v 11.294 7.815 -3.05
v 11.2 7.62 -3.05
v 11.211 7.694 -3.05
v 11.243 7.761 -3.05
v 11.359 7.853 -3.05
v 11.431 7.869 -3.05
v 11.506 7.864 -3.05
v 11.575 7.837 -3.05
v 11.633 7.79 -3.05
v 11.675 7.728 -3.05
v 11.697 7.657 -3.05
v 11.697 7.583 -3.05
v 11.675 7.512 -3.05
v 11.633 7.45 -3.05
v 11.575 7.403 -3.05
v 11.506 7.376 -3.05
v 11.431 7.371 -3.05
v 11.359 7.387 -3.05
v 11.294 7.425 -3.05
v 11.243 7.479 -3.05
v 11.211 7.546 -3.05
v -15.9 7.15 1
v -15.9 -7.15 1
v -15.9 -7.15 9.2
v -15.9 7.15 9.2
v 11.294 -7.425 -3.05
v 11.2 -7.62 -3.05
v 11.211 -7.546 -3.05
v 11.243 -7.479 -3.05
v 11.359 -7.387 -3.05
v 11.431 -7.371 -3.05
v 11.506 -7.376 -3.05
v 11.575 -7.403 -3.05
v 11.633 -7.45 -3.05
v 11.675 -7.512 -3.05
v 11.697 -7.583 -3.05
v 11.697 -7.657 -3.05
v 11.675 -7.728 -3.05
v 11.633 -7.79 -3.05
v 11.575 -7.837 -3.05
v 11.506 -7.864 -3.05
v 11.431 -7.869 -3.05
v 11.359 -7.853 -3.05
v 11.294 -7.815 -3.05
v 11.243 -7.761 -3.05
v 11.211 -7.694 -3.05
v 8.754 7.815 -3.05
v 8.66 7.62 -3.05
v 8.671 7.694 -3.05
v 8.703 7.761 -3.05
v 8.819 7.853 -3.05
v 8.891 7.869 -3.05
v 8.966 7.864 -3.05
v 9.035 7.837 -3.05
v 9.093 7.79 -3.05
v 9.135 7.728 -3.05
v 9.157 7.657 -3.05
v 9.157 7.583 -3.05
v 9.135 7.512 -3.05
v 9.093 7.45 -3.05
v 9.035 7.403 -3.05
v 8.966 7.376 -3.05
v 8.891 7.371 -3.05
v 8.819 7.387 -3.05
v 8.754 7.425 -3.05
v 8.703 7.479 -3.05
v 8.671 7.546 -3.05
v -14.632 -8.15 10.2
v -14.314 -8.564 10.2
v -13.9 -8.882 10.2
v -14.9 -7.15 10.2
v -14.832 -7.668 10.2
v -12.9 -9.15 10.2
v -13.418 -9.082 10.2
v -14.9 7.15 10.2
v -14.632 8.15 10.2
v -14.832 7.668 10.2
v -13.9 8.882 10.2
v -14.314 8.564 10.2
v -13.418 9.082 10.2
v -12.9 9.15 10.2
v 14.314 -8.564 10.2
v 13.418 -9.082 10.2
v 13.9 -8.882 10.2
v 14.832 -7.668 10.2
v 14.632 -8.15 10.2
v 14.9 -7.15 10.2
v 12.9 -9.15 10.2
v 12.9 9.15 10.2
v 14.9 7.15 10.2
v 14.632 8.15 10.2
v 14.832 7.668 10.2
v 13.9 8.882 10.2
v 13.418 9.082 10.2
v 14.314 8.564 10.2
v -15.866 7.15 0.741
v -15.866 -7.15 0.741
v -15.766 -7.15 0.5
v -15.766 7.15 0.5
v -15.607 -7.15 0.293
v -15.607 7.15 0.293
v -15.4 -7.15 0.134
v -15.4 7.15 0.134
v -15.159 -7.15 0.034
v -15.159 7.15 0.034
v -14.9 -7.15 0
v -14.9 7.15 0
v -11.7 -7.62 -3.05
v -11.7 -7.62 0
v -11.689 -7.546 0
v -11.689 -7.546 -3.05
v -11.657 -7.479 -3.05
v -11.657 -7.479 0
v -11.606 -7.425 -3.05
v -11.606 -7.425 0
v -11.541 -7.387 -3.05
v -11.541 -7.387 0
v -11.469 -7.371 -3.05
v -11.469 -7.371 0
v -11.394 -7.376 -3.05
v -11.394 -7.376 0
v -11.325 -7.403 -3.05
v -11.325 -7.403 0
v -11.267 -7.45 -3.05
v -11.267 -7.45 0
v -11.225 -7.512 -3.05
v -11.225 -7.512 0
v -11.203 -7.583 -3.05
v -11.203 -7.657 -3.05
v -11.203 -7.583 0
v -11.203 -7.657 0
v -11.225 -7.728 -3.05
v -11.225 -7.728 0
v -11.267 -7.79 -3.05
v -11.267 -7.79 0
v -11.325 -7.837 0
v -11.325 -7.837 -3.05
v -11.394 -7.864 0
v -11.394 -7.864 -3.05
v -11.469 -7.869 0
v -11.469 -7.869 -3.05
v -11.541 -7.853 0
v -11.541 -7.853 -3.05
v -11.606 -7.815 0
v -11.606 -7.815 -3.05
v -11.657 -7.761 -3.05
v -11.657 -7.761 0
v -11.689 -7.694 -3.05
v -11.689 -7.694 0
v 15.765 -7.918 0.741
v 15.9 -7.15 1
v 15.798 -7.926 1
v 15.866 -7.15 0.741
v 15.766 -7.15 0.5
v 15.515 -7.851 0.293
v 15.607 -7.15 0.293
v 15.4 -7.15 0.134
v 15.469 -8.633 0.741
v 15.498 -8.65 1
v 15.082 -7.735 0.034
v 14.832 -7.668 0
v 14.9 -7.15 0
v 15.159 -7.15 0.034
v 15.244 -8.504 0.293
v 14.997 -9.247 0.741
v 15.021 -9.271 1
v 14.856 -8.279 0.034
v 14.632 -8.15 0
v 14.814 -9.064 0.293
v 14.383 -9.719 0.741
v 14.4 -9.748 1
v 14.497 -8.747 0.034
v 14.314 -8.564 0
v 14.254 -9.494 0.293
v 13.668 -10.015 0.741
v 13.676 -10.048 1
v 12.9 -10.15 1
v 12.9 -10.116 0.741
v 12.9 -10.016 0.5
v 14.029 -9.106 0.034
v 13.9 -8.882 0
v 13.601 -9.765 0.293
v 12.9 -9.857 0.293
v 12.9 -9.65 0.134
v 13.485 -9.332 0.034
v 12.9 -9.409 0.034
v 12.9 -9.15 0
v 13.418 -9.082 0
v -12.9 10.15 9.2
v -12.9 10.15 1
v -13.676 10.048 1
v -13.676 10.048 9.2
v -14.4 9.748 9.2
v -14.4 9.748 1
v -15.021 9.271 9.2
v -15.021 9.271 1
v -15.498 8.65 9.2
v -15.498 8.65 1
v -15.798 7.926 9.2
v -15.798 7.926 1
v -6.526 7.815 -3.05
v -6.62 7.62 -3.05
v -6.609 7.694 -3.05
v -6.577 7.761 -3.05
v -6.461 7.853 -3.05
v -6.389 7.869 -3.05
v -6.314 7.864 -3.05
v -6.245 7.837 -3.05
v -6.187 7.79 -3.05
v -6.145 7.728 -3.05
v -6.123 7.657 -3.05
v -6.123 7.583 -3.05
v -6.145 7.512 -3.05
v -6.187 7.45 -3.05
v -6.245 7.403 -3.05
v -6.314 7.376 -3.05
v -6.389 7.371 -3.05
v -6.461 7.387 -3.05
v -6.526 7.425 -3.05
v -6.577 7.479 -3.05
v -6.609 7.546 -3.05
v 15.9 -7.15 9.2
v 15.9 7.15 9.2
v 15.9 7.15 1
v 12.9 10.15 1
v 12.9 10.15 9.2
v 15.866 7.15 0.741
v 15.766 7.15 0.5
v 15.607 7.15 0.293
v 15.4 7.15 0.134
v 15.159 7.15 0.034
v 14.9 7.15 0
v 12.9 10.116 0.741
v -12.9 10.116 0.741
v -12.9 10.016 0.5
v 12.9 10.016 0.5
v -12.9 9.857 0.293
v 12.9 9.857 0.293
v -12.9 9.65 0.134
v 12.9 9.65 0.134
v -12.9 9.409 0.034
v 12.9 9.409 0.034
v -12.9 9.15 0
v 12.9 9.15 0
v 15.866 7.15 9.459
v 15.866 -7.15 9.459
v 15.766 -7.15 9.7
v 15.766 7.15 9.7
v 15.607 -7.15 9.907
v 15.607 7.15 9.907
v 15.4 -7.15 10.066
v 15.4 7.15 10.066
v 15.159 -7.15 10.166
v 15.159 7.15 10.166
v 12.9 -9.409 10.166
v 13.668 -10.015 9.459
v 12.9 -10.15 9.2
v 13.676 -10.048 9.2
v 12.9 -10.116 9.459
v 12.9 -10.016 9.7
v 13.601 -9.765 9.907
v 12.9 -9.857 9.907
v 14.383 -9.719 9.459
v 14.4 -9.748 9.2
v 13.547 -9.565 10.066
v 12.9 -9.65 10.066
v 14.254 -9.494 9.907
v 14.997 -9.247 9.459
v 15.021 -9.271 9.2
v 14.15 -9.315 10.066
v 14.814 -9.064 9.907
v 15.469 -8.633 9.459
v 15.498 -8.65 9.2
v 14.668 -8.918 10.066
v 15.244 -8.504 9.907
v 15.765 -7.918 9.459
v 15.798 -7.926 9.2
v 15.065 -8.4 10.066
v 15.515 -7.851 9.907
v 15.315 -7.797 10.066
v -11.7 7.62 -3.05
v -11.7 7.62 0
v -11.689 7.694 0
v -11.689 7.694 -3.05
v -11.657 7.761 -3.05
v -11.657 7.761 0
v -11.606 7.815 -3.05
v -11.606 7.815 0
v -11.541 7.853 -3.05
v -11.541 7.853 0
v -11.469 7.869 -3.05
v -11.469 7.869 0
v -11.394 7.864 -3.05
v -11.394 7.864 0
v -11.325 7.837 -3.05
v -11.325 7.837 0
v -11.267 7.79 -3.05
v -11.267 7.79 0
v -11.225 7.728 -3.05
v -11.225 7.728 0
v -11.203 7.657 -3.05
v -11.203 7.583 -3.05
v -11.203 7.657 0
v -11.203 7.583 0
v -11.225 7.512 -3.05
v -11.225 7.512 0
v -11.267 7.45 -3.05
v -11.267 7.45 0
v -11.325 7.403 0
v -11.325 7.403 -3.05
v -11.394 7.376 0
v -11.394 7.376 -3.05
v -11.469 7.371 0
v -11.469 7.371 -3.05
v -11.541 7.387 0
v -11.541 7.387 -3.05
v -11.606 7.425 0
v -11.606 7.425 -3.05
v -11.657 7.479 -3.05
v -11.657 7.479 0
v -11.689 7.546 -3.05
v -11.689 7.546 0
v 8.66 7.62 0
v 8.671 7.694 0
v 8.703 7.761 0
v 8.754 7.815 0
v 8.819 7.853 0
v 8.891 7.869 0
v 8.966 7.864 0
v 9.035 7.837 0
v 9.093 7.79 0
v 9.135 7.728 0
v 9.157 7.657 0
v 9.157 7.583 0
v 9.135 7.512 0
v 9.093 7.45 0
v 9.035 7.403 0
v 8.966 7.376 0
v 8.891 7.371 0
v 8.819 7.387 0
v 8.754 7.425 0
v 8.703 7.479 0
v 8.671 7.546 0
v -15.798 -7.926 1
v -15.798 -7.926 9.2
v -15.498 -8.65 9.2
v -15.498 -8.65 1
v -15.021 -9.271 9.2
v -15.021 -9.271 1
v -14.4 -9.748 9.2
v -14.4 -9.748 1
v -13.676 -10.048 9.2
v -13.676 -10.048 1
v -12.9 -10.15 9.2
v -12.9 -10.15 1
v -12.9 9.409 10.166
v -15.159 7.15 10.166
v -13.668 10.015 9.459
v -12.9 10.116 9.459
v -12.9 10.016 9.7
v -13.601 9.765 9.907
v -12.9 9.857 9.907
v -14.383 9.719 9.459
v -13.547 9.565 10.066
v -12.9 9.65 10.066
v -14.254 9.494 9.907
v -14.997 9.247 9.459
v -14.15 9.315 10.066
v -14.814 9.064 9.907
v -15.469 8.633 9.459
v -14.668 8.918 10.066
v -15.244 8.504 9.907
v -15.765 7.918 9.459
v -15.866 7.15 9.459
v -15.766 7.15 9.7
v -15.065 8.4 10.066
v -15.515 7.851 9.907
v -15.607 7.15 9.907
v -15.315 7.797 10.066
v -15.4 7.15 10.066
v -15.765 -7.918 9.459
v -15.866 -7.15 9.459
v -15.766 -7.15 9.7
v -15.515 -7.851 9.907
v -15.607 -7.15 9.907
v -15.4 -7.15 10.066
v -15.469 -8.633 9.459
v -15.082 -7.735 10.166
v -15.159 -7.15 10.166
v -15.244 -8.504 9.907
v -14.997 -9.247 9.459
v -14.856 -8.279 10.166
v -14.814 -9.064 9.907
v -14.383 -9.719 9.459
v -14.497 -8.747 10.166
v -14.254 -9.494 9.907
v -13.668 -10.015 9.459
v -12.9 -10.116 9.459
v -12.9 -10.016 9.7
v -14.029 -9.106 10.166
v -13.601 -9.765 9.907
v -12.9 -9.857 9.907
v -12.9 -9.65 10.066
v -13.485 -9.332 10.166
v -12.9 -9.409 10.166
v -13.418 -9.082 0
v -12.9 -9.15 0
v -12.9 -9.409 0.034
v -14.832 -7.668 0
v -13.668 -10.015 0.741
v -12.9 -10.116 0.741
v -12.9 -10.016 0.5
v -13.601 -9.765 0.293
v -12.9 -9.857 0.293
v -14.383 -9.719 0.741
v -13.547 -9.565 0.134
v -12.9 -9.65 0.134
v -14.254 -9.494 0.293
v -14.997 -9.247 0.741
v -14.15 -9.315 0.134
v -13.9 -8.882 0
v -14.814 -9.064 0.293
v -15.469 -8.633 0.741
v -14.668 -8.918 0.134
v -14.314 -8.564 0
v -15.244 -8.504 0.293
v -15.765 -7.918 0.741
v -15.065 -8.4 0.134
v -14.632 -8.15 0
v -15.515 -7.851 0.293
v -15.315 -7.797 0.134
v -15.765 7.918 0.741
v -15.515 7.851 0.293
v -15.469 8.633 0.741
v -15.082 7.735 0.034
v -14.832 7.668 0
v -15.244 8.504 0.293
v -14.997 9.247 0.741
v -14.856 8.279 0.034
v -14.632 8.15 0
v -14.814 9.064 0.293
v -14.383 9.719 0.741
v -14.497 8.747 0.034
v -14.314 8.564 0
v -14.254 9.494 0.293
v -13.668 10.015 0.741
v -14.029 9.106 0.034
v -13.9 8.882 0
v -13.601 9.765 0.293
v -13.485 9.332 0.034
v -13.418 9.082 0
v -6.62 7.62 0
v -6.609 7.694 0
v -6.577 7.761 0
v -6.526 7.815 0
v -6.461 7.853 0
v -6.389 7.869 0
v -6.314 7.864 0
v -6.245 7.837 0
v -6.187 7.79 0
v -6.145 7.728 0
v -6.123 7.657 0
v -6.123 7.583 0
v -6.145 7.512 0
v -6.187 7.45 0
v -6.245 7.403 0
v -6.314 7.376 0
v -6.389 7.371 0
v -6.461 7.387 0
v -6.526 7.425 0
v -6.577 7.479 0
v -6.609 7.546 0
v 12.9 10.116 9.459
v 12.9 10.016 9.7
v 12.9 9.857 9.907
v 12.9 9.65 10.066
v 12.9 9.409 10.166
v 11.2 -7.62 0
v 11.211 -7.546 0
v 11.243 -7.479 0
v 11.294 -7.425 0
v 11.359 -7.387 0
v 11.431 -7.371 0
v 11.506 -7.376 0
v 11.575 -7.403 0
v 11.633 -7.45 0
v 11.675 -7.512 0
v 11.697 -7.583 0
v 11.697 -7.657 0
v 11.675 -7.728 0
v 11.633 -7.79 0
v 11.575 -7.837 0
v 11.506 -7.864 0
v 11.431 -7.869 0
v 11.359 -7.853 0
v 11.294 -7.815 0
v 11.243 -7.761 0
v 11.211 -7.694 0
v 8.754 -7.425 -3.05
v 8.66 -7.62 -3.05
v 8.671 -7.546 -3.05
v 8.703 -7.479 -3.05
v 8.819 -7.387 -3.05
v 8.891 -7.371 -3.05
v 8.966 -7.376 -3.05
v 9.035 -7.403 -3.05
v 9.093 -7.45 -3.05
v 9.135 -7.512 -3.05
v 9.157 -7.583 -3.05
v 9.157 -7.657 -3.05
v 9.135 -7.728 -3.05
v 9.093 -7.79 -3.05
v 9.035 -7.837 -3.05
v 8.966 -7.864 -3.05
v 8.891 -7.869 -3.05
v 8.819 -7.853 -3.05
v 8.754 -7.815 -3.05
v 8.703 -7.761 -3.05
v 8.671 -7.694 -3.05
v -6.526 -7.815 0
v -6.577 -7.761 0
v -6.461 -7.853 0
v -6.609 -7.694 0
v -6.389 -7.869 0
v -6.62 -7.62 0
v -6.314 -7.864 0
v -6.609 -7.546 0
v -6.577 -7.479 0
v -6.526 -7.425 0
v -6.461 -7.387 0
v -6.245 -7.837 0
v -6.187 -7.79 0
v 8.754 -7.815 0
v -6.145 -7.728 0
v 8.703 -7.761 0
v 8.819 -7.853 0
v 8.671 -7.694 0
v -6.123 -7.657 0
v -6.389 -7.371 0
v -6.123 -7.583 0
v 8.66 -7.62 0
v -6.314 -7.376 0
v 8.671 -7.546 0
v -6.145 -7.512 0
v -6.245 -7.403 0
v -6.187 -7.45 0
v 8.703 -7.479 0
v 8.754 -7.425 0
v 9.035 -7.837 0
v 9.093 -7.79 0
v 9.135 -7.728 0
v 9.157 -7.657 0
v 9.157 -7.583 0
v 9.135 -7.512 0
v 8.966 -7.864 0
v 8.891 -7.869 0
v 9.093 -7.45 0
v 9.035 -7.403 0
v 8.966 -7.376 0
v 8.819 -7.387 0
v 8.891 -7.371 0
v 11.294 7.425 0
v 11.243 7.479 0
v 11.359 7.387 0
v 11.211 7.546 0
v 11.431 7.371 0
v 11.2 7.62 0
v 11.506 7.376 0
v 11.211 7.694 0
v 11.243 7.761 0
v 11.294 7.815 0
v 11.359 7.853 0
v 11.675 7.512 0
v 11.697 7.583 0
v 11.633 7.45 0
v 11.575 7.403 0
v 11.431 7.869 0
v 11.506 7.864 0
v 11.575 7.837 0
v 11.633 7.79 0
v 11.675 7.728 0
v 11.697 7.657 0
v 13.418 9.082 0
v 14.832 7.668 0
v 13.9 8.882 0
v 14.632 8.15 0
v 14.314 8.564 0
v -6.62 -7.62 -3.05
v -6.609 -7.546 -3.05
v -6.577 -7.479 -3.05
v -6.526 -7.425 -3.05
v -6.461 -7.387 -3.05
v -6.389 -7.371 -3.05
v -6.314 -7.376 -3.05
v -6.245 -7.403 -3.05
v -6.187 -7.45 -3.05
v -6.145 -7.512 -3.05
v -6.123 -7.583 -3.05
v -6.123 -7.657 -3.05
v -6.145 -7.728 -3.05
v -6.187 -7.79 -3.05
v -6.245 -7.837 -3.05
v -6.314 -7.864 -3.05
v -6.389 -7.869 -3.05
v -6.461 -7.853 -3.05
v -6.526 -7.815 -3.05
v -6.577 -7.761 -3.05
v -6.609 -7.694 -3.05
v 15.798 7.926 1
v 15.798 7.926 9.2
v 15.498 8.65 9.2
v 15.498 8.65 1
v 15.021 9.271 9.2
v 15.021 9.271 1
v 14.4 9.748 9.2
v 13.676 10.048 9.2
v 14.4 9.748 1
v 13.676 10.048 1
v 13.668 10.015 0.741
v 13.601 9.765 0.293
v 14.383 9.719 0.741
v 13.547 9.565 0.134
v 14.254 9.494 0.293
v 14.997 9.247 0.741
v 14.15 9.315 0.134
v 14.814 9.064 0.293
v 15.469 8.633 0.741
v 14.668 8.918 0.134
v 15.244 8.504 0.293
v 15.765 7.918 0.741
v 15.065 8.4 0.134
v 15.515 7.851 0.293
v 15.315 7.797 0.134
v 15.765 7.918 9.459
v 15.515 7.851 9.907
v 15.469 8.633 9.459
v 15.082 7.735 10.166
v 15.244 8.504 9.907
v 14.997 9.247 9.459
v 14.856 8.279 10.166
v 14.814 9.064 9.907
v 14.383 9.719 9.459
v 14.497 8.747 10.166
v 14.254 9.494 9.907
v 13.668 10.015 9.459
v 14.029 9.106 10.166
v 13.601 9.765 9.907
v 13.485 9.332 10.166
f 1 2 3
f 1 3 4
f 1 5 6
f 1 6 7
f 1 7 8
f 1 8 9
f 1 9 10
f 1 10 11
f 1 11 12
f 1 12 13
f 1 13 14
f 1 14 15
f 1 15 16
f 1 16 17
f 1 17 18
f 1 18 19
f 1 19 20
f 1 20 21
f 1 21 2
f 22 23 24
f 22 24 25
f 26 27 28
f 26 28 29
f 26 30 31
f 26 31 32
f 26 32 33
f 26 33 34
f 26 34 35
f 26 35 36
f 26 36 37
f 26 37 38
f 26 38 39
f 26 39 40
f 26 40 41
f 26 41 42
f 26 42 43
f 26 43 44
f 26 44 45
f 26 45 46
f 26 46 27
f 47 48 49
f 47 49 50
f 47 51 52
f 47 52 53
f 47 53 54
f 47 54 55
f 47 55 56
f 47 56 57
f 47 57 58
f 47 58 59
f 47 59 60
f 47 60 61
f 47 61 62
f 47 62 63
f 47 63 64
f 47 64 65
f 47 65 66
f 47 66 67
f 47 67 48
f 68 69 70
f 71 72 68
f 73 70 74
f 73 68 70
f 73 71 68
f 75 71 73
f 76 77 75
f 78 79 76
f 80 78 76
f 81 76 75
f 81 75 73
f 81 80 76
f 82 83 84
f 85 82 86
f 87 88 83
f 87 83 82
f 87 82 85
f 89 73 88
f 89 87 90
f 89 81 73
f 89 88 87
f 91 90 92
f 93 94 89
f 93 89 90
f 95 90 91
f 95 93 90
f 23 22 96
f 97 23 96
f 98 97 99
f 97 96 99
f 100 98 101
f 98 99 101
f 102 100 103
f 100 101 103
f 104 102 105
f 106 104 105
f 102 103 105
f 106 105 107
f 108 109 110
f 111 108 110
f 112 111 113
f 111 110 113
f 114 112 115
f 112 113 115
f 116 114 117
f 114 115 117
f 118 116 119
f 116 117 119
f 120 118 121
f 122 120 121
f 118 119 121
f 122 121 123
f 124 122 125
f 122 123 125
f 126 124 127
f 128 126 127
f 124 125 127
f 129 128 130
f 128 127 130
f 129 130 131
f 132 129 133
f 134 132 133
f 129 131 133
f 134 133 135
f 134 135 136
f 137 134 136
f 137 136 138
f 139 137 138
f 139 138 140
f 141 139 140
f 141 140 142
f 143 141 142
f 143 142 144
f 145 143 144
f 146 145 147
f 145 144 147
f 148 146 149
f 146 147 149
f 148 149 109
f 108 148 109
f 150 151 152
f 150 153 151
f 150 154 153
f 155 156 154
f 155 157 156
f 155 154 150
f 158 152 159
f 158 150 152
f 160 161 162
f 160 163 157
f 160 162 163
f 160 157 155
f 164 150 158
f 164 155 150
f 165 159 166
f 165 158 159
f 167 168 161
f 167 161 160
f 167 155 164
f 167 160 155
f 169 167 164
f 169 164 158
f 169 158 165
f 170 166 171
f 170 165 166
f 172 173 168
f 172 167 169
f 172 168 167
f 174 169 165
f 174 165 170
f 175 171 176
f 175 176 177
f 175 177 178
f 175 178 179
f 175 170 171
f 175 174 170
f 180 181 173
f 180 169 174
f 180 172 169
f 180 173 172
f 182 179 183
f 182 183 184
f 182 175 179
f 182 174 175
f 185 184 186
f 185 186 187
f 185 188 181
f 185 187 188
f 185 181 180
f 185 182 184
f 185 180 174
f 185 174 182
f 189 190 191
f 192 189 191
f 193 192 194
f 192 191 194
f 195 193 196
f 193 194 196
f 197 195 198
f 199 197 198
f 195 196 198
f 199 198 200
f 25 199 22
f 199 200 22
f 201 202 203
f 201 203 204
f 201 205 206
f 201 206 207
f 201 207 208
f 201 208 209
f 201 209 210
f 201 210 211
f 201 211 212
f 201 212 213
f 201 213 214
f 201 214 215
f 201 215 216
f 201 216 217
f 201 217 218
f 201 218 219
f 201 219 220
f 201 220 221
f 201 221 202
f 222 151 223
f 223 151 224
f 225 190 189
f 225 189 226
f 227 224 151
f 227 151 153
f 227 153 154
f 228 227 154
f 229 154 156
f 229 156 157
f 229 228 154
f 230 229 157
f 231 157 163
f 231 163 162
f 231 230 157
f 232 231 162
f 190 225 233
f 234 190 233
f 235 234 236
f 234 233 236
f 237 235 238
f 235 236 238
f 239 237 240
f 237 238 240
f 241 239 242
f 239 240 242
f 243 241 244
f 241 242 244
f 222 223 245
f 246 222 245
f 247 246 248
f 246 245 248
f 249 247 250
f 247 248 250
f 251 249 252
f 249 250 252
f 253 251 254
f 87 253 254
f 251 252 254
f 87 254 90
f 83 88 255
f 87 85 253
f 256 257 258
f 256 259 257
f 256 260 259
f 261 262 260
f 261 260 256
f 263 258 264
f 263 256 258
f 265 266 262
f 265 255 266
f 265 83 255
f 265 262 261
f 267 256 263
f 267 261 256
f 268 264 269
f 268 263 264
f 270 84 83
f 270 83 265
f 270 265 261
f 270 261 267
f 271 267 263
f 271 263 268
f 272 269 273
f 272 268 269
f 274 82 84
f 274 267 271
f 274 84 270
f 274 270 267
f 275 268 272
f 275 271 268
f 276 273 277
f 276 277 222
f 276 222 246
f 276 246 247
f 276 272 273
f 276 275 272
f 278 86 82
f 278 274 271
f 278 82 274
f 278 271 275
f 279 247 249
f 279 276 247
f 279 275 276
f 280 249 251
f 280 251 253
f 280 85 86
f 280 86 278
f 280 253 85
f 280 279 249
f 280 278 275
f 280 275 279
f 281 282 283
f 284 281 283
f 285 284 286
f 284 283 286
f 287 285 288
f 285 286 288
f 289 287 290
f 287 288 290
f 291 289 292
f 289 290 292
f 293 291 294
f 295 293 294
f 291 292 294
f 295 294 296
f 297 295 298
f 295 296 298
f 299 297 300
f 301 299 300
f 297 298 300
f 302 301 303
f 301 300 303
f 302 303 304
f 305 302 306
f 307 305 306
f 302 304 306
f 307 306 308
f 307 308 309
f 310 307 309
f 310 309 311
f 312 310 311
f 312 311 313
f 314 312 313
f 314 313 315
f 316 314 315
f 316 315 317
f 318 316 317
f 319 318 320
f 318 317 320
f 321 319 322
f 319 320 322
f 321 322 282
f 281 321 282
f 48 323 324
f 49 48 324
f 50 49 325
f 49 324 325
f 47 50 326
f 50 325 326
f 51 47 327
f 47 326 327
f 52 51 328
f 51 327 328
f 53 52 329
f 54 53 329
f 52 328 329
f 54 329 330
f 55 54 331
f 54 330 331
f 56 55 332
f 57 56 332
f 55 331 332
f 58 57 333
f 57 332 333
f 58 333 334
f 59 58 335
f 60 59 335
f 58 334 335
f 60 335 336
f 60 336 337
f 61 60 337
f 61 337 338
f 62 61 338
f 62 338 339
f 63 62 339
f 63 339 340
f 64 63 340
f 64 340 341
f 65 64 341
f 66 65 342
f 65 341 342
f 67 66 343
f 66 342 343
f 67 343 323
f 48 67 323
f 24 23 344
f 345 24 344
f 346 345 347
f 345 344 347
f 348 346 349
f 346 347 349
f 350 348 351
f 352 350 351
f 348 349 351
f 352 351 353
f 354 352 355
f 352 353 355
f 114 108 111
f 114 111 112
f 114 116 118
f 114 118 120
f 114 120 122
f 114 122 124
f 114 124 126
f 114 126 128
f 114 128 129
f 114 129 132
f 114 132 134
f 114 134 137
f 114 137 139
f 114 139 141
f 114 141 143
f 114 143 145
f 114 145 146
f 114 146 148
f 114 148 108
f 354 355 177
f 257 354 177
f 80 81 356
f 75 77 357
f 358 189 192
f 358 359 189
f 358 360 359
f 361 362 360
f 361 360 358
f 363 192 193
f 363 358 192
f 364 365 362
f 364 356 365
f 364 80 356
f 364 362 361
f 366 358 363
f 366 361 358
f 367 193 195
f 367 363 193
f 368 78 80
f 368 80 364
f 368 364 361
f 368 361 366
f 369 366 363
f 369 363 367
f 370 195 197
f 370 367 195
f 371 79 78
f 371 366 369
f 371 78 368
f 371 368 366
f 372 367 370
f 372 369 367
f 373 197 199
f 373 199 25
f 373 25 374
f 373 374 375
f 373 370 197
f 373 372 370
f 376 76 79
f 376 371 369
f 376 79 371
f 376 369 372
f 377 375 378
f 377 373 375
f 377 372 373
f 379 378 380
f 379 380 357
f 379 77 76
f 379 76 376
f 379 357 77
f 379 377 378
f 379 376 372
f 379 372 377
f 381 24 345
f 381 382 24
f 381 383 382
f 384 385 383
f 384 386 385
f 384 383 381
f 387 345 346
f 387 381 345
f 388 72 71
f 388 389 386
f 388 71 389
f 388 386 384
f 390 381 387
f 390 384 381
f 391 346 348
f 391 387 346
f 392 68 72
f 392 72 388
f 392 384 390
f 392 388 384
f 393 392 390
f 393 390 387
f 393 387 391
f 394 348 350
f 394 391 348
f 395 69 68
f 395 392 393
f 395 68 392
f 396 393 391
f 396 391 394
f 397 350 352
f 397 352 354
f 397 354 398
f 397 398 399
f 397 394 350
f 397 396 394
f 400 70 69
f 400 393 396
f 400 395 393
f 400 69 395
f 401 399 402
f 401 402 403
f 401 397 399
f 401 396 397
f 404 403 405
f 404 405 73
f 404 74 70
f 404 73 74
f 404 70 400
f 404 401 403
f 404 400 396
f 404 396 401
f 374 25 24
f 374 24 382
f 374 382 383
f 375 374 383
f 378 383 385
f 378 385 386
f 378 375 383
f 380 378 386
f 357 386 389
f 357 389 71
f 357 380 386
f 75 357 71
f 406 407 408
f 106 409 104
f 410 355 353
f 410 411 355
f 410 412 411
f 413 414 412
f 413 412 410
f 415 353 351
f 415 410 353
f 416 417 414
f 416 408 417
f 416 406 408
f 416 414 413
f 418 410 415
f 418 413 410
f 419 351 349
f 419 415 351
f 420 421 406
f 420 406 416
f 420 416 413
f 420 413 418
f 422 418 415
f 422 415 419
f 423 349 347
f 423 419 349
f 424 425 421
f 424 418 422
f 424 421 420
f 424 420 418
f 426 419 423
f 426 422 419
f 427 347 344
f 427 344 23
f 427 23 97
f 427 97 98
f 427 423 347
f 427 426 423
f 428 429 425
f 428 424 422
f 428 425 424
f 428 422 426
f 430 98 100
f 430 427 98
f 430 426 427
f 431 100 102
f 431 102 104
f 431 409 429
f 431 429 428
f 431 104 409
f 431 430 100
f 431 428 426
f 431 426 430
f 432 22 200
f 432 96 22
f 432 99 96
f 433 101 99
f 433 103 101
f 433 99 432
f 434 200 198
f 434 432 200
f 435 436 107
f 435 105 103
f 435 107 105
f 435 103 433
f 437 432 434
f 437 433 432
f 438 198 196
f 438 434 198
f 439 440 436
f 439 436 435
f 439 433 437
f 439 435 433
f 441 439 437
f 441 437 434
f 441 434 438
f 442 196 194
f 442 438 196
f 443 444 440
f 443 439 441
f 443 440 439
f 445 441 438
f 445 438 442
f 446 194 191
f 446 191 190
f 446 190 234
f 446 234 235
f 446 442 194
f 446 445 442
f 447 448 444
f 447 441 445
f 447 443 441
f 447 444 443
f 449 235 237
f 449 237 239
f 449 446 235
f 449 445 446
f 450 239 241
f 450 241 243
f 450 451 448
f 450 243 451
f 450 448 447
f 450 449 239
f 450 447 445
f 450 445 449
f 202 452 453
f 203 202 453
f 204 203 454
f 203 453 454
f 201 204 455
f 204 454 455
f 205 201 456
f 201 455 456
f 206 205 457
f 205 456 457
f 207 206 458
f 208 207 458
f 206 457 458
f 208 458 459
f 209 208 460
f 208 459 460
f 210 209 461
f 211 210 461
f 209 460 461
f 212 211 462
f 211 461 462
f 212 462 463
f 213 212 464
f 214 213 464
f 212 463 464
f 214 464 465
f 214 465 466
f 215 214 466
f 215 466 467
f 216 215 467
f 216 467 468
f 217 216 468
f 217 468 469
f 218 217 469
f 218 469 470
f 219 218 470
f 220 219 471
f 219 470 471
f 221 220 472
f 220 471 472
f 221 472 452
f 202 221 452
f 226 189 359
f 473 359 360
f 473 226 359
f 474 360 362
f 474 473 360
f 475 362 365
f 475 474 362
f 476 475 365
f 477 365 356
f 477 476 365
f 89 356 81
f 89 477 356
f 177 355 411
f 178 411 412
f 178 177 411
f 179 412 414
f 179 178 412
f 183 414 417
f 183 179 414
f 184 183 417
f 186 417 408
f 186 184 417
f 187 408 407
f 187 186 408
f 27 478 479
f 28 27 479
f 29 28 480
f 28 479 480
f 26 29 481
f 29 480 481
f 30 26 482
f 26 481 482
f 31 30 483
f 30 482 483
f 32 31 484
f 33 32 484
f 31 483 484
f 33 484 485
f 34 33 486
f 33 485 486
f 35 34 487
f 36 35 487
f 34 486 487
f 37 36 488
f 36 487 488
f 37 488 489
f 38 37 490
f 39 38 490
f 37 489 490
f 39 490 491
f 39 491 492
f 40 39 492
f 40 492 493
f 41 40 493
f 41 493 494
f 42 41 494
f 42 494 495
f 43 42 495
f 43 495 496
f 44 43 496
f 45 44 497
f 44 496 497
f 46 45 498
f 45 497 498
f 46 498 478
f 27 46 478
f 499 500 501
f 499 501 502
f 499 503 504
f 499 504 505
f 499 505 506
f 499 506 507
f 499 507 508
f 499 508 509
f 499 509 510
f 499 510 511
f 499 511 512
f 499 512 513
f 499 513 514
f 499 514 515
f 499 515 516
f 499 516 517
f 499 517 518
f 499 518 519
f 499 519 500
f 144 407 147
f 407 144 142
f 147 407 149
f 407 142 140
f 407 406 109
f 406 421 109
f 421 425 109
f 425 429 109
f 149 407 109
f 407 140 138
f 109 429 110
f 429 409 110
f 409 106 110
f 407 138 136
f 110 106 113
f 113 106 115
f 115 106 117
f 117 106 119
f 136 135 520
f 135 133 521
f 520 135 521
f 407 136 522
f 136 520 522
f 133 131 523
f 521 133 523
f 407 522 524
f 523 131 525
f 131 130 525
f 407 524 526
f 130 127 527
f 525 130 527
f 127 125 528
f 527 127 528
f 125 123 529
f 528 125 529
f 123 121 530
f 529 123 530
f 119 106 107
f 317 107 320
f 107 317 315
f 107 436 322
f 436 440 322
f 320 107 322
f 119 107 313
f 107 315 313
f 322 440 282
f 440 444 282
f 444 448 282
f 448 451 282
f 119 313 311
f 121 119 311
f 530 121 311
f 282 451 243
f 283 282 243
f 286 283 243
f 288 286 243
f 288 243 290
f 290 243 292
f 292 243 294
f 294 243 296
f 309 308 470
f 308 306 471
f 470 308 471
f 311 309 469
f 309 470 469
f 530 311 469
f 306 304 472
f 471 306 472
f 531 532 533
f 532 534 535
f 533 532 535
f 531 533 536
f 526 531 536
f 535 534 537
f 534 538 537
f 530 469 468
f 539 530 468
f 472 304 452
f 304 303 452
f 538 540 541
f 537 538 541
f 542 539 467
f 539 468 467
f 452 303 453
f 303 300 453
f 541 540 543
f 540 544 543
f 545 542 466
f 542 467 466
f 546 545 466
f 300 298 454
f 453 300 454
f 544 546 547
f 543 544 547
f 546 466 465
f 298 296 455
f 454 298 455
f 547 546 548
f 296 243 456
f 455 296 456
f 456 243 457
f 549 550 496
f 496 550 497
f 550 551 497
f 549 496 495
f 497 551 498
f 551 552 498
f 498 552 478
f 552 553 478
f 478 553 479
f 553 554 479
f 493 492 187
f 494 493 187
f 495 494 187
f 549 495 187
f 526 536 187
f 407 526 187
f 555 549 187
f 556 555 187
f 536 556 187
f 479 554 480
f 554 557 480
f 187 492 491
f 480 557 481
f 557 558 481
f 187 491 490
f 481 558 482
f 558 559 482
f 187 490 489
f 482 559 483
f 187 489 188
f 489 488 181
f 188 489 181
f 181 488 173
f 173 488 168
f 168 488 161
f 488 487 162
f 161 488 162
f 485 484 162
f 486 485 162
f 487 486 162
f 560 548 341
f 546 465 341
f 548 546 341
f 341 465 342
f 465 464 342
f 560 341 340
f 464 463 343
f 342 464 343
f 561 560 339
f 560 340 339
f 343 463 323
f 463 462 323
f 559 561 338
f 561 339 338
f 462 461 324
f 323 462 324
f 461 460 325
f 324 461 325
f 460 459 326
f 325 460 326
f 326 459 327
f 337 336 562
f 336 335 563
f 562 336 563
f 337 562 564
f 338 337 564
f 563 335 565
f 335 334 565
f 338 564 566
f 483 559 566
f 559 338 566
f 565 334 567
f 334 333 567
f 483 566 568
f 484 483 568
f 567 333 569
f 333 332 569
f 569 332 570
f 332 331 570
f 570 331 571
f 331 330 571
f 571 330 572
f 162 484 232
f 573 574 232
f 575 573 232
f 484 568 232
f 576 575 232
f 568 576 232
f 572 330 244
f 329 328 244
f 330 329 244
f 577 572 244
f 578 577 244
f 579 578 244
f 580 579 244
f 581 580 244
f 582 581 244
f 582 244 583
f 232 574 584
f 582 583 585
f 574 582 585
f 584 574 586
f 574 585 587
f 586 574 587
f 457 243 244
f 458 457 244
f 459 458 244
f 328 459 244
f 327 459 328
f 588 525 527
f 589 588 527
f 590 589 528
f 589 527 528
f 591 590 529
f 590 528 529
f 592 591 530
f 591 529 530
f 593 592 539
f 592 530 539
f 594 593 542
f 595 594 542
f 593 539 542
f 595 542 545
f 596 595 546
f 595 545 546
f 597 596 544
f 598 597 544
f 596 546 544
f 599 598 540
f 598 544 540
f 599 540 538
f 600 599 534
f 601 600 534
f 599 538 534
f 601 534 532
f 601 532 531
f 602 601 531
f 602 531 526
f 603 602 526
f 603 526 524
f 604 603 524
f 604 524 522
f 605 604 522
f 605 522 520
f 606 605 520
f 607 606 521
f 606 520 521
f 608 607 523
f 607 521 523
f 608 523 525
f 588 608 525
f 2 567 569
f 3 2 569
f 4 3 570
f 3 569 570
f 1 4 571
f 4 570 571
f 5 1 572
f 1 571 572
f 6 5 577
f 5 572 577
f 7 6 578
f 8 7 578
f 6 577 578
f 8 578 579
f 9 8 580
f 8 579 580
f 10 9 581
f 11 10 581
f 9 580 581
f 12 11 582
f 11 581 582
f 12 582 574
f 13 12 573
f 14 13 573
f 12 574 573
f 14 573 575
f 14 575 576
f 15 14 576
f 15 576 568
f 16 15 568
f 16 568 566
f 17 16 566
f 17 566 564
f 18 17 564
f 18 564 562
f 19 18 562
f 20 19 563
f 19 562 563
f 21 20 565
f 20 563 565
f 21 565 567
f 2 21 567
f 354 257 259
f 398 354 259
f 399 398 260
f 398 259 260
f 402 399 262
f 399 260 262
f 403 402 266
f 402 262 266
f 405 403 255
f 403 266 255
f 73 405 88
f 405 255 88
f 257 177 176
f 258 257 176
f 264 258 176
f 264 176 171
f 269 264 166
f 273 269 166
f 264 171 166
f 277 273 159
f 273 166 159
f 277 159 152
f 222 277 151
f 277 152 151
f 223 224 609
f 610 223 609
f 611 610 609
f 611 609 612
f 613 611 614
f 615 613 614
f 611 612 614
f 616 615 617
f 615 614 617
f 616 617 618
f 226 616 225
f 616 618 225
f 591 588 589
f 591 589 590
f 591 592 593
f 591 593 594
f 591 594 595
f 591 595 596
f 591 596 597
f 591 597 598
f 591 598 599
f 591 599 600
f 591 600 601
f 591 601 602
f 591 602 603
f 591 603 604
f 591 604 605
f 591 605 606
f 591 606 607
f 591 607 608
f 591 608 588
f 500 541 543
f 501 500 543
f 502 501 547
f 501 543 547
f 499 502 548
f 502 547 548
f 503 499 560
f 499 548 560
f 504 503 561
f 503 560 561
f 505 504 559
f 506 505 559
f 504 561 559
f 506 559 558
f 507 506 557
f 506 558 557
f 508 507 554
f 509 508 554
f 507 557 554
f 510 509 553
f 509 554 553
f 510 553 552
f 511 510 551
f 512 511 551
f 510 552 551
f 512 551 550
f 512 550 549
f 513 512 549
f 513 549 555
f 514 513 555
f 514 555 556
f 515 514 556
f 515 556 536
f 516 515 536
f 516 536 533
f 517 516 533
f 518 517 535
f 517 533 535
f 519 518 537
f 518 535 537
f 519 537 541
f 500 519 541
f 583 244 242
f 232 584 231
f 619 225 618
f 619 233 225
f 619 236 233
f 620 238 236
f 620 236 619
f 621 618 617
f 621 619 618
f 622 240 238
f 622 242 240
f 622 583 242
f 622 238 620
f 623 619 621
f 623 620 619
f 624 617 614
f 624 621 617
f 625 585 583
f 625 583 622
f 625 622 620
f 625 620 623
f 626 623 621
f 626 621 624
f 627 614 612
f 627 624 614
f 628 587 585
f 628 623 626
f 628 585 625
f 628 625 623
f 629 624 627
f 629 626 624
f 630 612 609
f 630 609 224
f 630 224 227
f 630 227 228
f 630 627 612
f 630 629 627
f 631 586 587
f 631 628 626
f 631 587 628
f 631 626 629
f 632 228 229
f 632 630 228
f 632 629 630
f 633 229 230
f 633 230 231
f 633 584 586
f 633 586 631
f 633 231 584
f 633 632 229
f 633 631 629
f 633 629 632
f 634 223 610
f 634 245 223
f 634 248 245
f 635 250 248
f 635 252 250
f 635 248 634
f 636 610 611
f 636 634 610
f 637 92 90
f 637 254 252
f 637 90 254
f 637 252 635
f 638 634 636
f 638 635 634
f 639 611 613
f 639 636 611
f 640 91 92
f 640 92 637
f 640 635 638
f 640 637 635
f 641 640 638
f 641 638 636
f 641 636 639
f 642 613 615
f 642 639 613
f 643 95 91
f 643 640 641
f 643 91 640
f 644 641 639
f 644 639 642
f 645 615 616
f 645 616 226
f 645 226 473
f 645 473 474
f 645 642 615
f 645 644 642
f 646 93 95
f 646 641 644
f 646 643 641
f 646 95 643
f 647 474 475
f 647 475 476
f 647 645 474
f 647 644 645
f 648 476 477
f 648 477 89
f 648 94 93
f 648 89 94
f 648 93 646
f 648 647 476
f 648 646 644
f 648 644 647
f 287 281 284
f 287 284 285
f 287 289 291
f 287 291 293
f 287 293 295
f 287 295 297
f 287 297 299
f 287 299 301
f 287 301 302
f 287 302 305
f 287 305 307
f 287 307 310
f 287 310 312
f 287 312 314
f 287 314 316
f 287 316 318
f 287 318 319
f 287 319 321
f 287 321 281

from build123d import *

# Parameters (mm, degrees)
SKETCH_1_W      = 31.8
SKETCH_1_H      = 20.3
EXTRUDE_1_DEPTH = 10.2
FILLET_2_R      = 1
FILLET_1_R      = 3
SKETCH_2_R      = 0.25
EXTRUDE_2_DEPTH = 3.05


with BuildPart() as part:
    # Эскиз1 → Бобышка-Вытянуть1 (new body)
    with BuildSketch(Plane.XY):
        Rectangle(SKETCH_1_W, SKETCH_1_H)
    extrude(amount=EXTRUDE_1_DEPTH)

    # Скругление2
    fillet_2_edges = [part.edges().sort_by_distance(p)[0] for p in [
        (-15.9, 0, 10.2),
        (0, -10.15, 10.2),
        (15.9, 0, 10.2),
        (0, -10.15, 0),
        (-15.9, 0, 0),
        (0, 10.15, 0),
        (15.9, 0, 0),
        (0, 10.15, 10.2),
    ]]
    fillet(fillet_2_edges, radius=FILLET_2_R)

    # Скругление1
    # the kernel refuses this fillet: 3 mm, written as the material it takes off along each edge
    with BuildSketch(Plane(origin=(12.9, -7.15, 0), x_dir=(1, 0, 0), z_dir=(0, 1, 0))) as fillet_1_piece_1:
        with BuildLine():
            CenterArc((2, -1), 1, 0, 90)
            Line((3, -1), (3, 0))
            Line((3, 0), (2, 0))
        make_face()
    revolve(axis=Axis((12.9, -7.15, 0), (0, 0, -1)), revolution_arc=90, mode=Mode.SUBTRACT)
    with BuildSketch(Plane(origin=(-12.9, -7.15, 0), x_dir=(0, -1, 0), z_dir=(1, 0, 0))) as fillet_1_piece_2:
        with BuildLine():
            CenterArc((2, -1), 1, 0, 90)
            Line((3, -1), (3, 0))
            Line((3, 0), (2, 0))
        make_face()
    revolve(axis=Axis((-12.9, -7.15, 0), (0, 0, -1)), revolution_arc=90, mode=Mode.SUBTRACT)
    with BuildSketch(Plane(origin=(12.9, 7.15, 0), x_dir=(0, 1, 0), z_dir=(-1, 0, 0))) as fillet_1_piece_3:
        with BuildLine():
            CenterArc((2, -1), 1, 0, 90)
            Line((3, -1), (3, 0))
            Line((3, 0), (2, 0))
        make_face()
    revolve(axis=Axis((12.9, 7.15, 0), (0, 0, -1)), revolution_arc=90, mode=Mode.SUBTRACT)
    with BuildSketch(Plane(origin=(-12.9, 7.15, 0), x_dir=(-1, 0, 0), z_dir=(0, -1, 0))) as fillet_1_piece_4:
        with BuildLine():
            CenterArc((2, -1), 1, 0, 90)
            Line((3, -1), (3, 0))
            Line((3, 0), (2, 0))
        make_face()
    revolve(axis=Axis((-12.9, 7.15, 0), (0, 0, -1)), revolution_arc=90, mode=Mode.SUBTRACT)
    with BuildSketch(Plane(origin=(12.9, -7.15, 10.2), x_dir=(0, -1, 0), z_dir=(-1, 0, 0))) as fillet_1_piece_5:
        with BuildLine():
            CenterArc((2, -1), 1, 0, 90)
            Line((3, -1), (3, 0))
            Line((3, 0), (2, 0))
        make_face()
    revolve(axis=Axis((12.9, -7.15, 10.2), (0, 0, 1)), revolution_arc=90, mode=Mode.SUBTRACT)
    with BuildSketch(Plane(origin=(-12.9, -7.15, 10.2), x_dir=(-1, 0, 0), z_dir=(0, 1, 0))) as fillet_1_piece_6:
        with BuildLine():
            CenterArc((2, -1), 1, 0, 90)
            Line((3, -1), (3, 0))
            Line((3, 0), (2, 0))
        make_face()
    revolve(axis=Axis((-12.9, -7.15, 10.2), (0, 0, 1)), revolution_arc=90, mode=Mode.SUBTRACT)
    with BuildSketch(Plane(origin=(12.9, 7.15, 10.2), x_dir=(1, 0, 0), z_dir=(0, -1, 0))) as fillet_1_piece_7:
        with BuildLine():
            CenterArc((2, -1), 1, 0, 90)
            Line((3, -1), (3, 0))
            Line((3, 0), (2, 0))
        make_face()
    revolve(axis=Axis((12.9, 7.15, 10.2), (0, 0, 1)), revolution_arc=90, mode=Mode.SUBTRACT)
    with BuildSketch(Plane(origin=(-12.9, 7.15, 10.2), x_dir=(0, 1, 0), z_dir=(1, 0, 0))) as fillet_1_piece_8:
        with BuildLine():
            CenterArc((2, -1), 1, 0, 90)
            Line((3, -1), (3, 0))
            Line((3, 0), (2, 0))
        make_face()
    revolve(axis=Axis((-12.9, 7.15, 10.2), (0, 0, 1)), revolution_arc=90, mode=Mode.SUBTRACT)
    with BuildSketch(Plane(origin=(-15.9, 10.15, 0), x_dir=(0, -1, 0), z_dir=(0, 0, 1)), Plane(origin=(-15.9, -10.15, 0), x_dir=(1, 0, 0), z_dir=(0, 0, 1))) as fillet_1_piece_9:
        with BuildLine():
            CenterArc((FILLET_1_R, FILLET_1_R), FILLET_1_R, 180, 90)
            Line((0, FILLET_1_R), (0, 0))
            Line((0, 0), (FILLET_1_R, 0))
        make_face()
    extrude(amount=10.2, mode=Mode.SUBTRACT)
    with BuildSketch(Plane(origin=(15.9, 10.15, 0), x_dir=(0, -1, 0), z_dir=(0, 0, 1)), Plane(origin=(15.9, -10.15, 0), x_dir=(-1, 0, 0), z_dir=(0, 0, 1))) as fillet_1_piece_10:
        with BuildLine():
            CenterArc((FILLET_1_R, -FILLET_1_R), FILLET_1_R, 90, 90)
            Line((0, -FILLET_1_R), (0, 0))
            Line((0, 0), (FILLET_1_R, 0))
        make_face()
    extrude(amount=10.2, mode=Mode.SUBTRACT)

    # Эскиз2 → Бобышка-Вытянуть2 (add)
    with BuildSketch(Plane(origin=(0, 0, 0), x_dir=(-1, 0, 0), z_dir=(0, 0, -1))):
        with Locations((11.45, 7.62)):
            Circle(SKETCH_2_R)
        with Locations((6.37, 7.62)):
            Circle(SKETCH_2_R)
        with Locations((-8.91, 7.62)):
            Circle(SKETCH_2_R)
        with Locations((-11.45, 7.62)):
            Circle(SKETCH_2_R)
        with Locations((-11.45, -7.62)):
            Circle(SKETCH_2_R)
        with Locations((-8.91, -7.62)):
            Circle(SKETCH_2_R)
        with Locations((6.37, -7.62)):
            Circle(SKETCH_2_R)
        with Locations((11.45, -7.62)):
            Circle(SKETCH_2_R)
    extrude(amount=EXTRUDE_2_DEPTH)


solid = part.part
